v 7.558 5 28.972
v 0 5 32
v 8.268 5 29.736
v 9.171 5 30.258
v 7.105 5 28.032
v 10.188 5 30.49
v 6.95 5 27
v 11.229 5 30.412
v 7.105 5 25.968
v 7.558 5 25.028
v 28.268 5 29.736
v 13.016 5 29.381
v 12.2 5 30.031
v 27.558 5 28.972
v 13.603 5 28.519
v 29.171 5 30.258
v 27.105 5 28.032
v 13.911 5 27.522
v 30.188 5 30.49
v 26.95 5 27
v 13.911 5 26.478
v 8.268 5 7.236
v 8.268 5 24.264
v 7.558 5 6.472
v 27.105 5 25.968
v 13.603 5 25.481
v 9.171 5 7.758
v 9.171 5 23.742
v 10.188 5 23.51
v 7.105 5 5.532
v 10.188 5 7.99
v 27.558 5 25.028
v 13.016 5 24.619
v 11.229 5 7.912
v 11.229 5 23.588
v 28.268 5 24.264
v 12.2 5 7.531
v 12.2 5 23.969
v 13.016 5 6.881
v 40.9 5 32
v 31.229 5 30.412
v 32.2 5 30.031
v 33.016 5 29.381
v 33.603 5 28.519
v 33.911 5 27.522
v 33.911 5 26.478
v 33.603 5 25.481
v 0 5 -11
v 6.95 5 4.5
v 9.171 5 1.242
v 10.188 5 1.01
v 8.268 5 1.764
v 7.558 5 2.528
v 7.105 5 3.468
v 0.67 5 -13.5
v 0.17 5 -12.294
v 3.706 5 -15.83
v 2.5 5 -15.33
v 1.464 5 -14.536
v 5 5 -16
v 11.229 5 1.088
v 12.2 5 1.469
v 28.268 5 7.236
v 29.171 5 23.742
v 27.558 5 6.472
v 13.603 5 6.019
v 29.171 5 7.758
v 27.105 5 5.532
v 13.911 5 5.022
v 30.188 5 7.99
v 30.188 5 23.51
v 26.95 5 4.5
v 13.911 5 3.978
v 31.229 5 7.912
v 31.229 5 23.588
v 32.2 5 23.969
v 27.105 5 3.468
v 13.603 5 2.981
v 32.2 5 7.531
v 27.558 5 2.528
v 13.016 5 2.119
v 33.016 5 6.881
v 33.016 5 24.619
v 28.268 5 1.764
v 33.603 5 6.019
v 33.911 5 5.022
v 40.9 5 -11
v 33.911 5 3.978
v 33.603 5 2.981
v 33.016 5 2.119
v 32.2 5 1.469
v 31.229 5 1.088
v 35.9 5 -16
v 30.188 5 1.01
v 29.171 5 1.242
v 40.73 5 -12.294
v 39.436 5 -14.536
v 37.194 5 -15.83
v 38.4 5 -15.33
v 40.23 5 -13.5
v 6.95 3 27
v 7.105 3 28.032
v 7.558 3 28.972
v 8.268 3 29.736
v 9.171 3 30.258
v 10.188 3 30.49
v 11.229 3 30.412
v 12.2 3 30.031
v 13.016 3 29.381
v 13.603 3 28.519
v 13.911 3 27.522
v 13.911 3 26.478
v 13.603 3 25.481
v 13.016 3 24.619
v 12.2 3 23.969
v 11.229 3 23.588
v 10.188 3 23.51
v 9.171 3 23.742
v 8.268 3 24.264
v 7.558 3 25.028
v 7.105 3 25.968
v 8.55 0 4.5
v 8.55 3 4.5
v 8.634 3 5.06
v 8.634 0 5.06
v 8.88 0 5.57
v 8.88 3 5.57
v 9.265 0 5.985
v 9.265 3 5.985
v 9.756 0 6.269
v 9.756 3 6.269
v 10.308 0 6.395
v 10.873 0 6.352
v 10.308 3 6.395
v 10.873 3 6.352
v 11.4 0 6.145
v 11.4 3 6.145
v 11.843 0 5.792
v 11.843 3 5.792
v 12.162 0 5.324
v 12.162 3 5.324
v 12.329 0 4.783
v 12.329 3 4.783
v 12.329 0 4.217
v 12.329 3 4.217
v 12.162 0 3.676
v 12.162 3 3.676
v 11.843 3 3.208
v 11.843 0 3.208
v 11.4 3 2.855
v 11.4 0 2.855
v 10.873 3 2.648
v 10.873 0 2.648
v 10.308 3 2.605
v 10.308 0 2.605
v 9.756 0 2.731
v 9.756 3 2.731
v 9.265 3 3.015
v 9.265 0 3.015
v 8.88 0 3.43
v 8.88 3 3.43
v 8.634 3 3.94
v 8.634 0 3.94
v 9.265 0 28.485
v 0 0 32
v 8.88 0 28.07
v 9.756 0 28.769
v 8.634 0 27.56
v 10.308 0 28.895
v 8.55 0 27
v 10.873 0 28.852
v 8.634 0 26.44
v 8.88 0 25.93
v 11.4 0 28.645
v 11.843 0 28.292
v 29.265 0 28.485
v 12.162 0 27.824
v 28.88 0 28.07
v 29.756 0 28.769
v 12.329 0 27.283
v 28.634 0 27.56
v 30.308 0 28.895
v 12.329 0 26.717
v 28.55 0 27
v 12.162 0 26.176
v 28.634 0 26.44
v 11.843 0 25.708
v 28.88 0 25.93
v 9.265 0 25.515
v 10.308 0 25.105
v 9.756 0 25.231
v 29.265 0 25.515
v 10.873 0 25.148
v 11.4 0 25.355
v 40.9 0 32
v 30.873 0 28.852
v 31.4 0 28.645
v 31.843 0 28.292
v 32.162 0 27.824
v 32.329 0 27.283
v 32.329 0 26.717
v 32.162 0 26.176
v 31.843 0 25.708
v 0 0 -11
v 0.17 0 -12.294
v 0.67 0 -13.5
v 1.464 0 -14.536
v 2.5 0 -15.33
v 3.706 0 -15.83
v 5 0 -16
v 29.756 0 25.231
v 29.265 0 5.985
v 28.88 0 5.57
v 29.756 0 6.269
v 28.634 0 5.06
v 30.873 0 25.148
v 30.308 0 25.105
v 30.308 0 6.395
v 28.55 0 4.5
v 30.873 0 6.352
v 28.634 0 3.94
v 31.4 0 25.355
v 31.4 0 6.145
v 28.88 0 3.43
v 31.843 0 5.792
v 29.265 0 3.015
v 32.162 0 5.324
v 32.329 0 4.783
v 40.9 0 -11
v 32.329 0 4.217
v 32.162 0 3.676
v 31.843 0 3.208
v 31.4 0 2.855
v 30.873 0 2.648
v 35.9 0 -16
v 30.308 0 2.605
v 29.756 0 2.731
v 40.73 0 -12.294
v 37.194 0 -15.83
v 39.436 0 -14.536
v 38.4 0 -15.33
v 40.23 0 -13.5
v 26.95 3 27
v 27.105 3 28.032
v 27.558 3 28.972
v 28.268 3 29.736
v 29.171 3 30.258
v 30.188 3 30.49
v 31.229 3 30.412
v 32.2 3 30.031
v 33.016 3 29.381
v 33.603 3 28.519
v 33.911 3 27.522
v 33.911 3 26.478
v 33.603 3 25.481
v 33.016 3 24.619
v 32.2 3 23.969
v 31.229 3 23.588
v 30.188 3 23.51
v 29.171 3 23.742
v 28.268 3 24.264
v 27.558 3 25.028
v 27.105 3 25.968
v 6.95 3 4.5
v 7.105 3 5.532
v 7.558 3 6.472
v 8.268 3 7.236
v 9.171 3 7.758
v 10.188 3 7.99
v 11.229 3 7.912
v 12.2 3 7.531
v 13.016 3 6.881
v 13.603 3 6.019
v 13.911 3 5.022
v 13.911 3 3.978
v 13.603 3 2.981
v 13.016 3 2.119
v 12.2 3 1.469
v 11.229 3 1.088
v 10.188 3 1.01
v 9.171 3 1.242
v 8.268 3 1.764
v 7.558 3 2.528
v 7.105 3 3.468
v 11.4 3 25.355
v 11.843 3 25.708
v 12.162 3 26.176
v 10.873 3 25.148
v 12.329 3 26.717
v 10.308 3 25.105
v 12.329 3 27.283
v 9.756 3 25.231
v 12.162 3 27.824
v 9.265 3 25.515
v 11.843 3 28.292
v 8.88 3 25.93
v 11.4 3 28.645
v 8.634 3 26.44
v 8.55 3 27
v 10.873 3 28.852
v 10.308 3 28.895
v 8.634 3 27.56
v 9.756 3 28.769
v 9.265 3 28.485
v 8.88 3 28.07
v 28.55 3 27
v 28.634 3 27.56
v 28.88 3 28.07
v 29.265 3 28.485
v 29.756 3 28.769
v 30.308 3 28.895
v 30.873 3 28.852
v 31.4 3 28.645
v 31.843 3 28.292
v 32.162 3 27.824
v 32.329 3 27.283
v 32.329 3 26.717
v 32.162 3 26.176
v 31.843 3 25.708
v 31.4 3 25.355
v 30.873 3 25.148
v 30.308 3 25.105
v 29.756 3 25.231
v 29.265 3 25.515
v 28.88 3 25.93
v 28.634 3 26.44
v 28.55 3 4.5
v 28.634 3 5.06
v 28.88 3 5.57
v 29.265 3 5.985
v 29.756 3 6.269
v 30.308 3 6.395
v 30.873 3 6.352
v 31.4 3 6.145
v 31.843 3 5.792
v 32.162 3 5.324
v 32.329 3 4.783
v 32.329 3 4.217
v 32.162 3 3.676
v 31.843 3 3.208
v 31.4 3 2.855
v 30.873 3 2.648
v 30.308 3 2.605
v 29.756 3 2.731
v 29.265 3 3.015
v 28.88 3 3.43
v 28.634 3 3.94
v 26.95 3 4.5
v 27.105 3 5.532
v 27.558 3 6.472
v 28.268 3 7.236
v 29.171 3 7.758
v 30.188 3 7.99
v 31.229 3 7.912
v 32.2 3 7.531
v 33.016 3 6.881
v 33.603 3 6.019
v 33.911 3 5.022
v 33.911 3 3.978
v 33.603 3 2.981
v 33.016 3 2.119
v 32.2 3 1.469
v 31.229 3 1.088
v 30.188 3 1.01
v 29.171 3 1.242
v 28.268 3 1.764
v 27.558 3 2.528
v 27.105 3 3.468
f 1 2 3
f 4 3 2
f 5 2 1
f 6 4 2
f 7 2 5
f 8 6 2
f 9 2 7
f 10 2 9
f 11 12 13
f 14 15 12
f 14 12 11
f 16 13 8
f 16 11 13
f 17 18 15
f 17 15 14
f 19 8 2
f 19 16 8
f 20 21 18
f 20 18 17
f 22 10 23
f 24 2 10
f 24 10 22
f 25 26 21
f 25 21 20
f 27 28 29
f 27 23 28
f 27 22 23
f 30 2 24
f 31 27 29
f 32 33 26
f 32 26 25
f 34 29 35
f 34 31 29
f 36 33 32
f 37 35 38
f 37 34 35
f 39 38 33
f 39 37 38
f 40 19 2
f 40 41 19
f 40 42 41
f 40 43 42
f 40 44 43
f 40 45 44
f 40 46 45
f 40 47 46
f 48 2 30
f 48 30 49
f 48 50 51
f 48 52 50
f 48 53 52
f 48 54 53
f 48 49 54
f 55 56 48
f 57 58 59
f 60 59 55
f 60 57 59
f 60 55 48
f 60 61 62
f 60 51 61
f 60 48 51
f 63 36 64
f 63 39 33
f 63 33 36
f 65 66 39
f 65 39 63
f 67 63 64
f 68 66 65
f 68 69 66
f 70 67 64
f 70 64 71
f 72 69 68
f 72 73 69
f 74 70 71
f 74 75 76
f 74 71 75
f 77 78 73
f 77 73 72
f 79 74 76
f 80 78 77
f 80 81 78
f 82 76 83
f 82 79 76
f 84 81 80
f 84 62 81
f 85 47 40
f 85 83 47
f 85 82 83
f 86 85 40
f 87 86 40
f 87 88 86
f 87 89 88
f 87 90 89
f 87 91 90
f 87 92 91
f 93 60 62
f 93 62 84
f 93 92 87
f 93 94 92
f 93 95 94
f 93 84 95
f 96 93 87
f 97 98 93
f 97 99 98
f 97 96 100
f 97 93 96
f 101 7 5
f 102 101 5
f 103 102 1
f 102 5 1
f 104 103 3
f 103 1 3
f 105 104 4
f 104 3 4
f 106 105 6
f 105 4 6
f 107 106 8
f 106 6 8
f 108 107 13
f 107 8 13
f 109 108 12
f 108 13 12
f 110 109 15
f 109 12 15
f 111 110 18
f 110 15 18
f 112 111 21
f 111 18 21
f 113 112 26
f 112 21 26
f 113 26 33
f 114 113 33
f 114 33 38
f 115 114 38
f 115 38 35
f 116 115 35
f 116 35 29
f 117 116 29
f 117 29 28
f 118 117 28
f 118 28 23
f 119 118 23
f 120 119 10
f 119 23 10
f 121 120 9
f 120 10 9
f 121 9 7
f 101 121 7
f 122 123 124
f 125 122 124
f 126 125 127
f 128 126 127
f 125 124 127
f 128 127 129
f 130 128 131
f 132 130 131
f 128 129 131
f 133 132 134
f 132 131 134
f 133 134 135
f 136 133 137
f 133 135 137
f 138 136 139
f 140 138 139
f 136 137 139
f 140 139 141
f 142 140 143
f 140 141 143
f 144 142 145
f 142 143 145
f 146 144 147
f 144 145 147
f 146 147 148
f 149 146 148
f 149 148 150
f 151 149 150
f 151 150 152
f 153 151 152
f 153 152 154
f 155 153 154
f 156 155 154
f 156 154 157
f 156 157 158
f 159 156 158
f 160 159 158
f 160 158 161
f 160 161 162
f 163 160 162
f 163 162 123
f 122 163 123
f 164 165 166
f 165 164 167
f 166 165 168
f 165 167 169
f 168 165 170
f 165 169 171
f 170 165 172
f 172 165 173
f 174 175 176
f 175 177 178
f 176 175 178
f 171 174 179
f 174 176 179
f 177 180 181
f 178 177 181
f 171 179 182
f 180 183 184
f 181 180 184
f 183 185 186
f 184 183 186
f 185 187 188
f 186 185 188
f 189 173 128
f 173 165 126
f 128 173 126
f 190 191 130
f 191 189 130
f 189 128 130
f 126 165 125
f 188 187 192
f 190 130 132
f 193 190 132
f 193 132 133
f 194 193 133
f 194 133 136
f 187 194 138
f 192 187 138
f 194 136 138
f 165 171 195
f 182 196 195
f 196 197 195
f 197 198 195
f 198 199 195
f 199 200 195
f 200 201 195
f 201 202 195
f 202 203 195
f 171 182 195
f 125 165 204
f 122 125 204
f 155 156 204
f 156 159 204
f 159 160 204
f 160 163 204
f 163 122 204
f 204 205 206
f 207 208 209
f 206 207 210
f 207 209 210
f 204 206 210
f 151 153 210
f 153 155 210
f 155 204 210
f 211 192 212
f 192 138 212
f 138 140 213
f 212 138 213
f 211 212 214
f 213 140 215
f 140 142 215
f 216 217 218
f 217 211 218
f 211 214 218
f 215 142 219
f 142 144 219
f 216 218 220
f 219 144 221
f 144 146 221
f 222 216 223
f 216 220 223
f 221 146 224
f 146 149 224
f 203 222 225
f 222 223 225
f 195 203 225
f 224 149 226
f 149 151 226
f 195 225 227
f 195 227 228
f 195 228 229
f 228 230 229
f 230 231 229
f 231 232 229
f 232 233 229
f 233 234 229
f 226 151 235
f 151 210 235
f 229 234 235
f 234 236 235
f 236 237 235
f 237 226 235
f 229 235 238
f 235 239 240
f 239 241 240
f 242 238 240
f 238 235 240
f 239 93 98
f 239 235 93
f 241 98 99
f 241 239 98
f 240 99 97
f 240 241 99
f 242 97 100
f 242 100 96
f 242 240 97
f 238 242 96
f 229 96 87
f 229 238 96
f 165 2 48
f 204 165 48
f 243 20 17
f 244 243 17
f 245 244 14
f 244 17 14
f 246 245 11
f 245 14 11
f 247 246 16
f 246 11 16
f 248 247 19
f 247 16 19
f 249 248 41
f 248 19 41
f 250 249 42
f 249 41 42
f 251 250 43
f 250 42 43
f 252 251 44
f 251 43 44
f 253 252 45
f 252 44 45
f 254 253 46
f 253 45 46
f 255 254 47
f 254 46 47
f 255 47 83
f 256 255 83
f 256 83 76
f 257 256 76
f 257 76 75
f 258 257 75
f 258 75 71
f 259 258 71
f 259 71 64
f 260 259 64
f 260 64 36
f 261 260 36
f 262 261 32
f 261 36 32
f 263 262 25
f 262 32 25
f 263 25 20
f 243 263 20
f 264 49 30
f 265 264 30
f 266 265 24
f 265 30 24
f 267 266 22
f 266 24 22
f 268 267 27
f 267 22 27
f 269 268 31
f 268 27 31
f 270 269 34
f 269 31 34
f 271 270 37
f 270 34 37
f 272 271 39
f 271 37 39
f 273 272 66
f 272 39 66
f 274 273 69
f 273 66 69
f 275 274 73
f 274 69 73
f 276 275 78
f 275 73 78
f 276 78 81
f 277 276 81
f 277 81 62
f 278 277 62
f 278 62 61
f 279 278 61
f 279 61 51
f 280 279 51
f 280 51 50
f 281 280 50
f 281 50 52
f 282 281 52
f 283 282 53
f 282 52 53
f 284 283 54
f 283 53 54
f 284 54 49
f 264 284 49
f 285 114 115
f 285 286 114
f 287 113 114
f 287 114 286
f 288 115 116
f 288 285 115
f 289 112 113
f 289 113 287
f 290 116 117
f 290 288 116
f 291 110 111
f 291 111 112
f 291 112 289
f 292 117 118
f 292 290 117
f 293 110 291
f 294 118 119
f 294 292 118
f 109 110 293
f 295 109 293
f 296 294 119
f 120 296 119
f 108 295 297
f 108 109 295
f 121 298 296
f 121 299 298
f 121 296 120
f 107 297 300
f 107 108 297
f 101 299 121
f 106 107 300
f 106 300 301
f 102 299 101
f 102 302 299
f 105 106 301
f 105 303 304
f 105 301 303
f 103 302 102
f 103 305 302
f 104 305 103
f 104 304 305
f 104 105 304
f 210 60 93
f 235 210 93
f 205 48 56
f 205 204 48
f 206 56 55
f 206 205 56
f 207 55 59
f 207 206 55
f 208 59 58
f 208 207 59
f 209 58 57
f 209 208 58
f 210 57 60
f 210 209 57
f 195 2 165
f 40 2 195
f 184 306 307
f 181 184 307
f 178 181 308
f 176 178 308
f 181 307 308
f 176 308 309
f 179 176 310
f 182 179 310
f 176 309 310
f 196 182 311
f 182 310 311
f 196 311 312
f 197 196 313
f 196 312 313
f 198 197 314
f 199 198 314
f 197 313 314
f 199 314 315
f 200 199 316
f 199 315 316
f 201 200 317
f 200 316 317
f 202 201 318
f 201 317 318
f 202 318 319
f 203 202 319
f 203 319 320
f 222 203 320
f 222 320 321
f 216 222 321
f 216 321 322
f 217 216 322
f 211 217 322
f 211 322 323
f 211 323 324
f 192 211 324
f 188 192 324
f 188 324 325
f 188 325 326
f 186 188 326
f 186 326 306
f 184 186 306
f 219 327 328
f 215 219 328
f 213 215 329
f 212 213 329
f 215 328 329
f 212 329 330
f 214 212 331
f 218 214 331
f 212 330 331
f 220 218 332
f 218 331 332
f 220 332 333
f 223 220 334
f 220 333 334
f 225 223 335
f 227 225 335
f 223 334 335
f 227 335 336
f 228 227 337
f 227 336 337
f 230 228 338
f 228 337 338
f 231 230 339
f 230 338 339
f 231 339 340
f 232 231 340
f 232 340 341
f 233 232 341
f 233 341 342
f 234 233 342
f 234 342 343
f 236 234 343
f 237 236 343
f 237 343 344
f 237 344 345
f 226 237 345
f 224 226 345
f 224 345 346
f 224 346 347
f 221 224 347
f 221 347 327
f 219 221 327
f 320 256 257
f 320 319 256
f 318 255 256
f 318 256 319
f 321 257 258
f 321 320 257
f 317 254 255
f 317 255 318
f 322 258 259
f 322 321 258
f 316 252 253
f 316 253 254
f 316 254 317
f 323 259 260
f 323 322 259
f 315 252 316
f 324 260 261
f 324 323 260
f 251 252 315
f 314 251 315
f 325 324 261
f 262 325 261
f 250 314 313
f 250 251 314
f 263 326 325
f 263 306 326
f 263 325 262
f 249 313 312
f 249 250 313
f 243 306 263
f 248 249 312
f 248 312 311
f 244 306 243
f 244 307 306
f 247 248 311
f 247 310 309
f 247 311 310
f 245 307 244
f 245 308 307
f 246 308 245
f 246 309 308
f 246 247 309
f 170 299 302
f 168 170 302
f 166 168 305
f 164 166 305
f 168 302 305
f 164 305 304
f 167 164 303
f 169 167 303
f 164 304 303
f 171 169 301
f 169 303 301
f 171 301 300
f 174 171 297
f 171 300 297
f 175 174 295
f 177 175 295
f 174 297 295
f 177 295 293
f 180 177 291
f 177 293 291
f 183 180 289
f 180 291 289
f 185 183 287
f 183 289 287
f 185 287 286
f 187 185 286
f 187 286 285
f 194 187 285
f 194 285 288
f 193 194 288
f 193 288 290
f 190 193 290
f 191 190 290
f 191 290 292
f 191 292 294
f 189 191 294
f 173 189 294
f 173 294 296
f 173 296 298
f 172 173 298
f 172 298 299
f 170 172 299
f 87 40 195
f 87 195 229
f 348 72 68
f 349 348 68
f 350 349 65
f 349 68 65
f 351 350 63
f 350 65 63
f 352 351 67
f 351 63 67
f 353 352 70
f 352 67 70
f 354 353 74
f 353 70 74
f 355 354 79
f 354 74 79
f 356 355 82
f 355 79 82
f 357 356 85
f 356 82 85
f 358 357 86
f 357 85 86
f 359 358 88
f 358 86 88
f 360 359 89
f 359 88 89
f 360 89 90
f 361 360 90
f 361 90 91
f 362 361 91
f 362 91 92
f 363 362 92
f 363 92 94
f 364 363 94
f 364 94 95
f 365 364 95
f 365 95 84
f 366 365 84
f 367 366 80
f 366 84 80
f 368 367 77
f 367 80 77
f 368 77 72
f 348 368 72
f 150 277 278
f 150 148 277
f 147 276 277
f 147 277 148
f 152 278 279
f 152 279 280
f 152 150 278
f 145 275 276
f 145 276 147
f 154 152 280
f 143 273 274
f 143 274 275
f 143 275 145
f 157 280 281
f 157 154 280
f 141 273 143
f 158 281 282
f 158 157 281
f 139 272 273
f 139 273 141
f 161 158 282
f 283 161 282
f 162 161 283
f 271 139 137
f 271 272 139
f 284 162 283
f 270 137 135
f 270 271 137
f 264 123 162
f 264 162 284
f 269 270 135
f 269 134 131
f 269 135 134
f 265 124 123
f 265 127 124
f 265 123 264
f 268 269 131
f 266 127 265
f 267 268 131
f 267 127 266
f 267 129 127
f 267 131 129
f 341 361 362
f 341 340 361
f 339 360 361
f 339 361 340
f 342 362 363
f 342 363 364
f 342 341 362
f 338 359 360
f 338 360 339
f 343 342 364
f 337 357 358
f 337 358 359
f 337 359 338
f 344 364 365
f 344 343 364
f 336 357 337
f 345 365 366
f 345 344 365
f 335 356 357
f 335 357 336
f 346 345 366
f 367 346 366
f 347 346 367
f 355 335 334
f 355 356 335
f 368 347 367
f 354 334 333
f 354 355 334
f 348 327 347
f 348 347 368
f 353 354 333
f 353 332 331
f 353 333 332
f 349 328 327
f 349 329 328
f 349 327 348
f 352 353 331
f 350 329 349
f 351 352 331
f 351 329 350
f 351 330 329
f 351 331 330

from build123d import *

# Parameters (mm, degrees)
BOSS_EXTRU_1_DEPTH      = 9
BOSS_EXTRU_1_DEPTH_BACK = 9
ESQUISSE1_R             = 2
ESQUISSE2_W             = 40.9
ESQUISSE2_H             = 7
ESQUISSE2_H_2           = 23
BOSS_EXTRU_2_DEPTH      = 5
ESQUISSE5_W             = 8
ESQUISSE5_H             = 18
ENL_V_MAT_EXTRU_2_DEPTH = 64.562646263
ESQUISSE6_R             = 1.9
ENL_V_MAT_EXTRU_3_DEPTH = 10
CONG_1_R                = 5
ESQUISSE7_R             = 3.5
ENL_V_MAT_EXTRU_4_DEPTH = 2


with BuildPart() as part:
    # Esquisse1 → Boss.-Extru.1 (new, two sides: drawn at the far end of the back side and taken through both)
    with BuildSketch(Plane.XY.offset(-BOSS_EXTRU_1_DEPTH_BACK)):
        Polygon((0, 25), (-8, 25), (-8, 0), (48.9, 0), (48.9, 25), (40.9, 25), (40.9, 5), (0, 5), align=None)
        with Locations((-3.85, 10)):
            Circle(ESQUISSE1_R, mode=Mode.SUBTRACT)
        with Locations((-3.85, 20)):
            Circle(ESQUISSE1_R, mode=Mode.SUBTRACT)
        with Locations((44.75, 20)):
            Circle(ESQUISSE1_R, mode=Mode.SUBTRACT)
        with Locations((44.75, 10)):
            Circle(ESQUISSE1_R, mode=Mode.SUBTRACT)
    extrude(amount=BOSS_EXTRU_1_DEPTH + BOSS_EXTRU_1_DEPTH_BACK)

    # Esquisse2 → Boss.-Extru.2 (add)
    with BuildSketch(Plane(origin=(0, 5, 0), x_dir=(1, 0, 0), z_dir=(0, 1, 0))):
        with Locations((20.45, 12.5)):
            Rectangle(ESQUISSE2_W, ESQUISSE2_H)
        with Locations((20.45, -20.5)):
            Rectangle(ESQUISSE2_W, ESQUISSE2_H_2)
    extrude(amount=-BOSS_EXTRU_2_DEPTH)

    # Esquisse5 → Enlèv. mat.-Extru.2 (cut, through all)
    with BuildSketch(Plane(origin=(0, 25, 0), x_dir=(1, 0, 0), z_dir=(0, 1, 0))):
        with Locations((-4, 0)):
            Rectangle(ESQUISSE5_W, ESQUISSE5_H)
        with Locations((44.9, 0)):
            Rectangle(ESQUISSE5_W, ESQUISSE5_H)
    extrude(amount=-ENL_V_MAT_EXTRU_2_DEPTH, mode=Mode.SUBTRACT)

    # Esquisse6 → Enlèv. mat.-Extru.3 (cut)
    with BuildSketch(Plane(origin=(0, 5, 0), x_dir=(1, 0, 0), z_dir=(0, 1, 0))):
        with Locations((10.45, -4.5)):
            Circle(ESQUISSE6_R)
        with Locations((30.45, -4.5)):
            Circle(ESQUISSE6_R)
        with Locations((10.45, -27)):
            Circle(ESQUISSE6_R)
        with Locations((30.45, -27)):
            Circle(ESQUISSE6_R)
    extrude(amount=-ENL_V_MAT_EXTRU_3_DEPTH, mode=Mode.SUBTRACT)

    # Congé1
    cong_1_edges = [part.edges().sort_by_distance(p)[0] for p in [
        (40.9, 2.5, -16),
        (0, 2.5, -16),
    ]]
    fillet(cong_1_edges, radius=CONG_1_R)

    # Esquisse7 → Enlèv. mat.-Extru.4 (cut)
    with BuildSketch(Plane(origin=(0, 5, 0), x_dir=(1, 0, 0), z_dir=(0, 1, 0))):
        with Locations((10.45, -4.5)):
            Circle(ESQUISSE7_R)
        with Locations((30.45, -4.5)):
            Circle(ESQUISSE7_R)
        with Locations((30.45, -27)):
            Circle(ESQUISSE7_R)
        with Locations((10.45, -27)):
            Circle(ESQUISSE7_R)
    extrude(amount=-ENL_V_MAT_EXTRU_4_DEPTH, mode=Mode.SUBTRACT)


solid = part.part
